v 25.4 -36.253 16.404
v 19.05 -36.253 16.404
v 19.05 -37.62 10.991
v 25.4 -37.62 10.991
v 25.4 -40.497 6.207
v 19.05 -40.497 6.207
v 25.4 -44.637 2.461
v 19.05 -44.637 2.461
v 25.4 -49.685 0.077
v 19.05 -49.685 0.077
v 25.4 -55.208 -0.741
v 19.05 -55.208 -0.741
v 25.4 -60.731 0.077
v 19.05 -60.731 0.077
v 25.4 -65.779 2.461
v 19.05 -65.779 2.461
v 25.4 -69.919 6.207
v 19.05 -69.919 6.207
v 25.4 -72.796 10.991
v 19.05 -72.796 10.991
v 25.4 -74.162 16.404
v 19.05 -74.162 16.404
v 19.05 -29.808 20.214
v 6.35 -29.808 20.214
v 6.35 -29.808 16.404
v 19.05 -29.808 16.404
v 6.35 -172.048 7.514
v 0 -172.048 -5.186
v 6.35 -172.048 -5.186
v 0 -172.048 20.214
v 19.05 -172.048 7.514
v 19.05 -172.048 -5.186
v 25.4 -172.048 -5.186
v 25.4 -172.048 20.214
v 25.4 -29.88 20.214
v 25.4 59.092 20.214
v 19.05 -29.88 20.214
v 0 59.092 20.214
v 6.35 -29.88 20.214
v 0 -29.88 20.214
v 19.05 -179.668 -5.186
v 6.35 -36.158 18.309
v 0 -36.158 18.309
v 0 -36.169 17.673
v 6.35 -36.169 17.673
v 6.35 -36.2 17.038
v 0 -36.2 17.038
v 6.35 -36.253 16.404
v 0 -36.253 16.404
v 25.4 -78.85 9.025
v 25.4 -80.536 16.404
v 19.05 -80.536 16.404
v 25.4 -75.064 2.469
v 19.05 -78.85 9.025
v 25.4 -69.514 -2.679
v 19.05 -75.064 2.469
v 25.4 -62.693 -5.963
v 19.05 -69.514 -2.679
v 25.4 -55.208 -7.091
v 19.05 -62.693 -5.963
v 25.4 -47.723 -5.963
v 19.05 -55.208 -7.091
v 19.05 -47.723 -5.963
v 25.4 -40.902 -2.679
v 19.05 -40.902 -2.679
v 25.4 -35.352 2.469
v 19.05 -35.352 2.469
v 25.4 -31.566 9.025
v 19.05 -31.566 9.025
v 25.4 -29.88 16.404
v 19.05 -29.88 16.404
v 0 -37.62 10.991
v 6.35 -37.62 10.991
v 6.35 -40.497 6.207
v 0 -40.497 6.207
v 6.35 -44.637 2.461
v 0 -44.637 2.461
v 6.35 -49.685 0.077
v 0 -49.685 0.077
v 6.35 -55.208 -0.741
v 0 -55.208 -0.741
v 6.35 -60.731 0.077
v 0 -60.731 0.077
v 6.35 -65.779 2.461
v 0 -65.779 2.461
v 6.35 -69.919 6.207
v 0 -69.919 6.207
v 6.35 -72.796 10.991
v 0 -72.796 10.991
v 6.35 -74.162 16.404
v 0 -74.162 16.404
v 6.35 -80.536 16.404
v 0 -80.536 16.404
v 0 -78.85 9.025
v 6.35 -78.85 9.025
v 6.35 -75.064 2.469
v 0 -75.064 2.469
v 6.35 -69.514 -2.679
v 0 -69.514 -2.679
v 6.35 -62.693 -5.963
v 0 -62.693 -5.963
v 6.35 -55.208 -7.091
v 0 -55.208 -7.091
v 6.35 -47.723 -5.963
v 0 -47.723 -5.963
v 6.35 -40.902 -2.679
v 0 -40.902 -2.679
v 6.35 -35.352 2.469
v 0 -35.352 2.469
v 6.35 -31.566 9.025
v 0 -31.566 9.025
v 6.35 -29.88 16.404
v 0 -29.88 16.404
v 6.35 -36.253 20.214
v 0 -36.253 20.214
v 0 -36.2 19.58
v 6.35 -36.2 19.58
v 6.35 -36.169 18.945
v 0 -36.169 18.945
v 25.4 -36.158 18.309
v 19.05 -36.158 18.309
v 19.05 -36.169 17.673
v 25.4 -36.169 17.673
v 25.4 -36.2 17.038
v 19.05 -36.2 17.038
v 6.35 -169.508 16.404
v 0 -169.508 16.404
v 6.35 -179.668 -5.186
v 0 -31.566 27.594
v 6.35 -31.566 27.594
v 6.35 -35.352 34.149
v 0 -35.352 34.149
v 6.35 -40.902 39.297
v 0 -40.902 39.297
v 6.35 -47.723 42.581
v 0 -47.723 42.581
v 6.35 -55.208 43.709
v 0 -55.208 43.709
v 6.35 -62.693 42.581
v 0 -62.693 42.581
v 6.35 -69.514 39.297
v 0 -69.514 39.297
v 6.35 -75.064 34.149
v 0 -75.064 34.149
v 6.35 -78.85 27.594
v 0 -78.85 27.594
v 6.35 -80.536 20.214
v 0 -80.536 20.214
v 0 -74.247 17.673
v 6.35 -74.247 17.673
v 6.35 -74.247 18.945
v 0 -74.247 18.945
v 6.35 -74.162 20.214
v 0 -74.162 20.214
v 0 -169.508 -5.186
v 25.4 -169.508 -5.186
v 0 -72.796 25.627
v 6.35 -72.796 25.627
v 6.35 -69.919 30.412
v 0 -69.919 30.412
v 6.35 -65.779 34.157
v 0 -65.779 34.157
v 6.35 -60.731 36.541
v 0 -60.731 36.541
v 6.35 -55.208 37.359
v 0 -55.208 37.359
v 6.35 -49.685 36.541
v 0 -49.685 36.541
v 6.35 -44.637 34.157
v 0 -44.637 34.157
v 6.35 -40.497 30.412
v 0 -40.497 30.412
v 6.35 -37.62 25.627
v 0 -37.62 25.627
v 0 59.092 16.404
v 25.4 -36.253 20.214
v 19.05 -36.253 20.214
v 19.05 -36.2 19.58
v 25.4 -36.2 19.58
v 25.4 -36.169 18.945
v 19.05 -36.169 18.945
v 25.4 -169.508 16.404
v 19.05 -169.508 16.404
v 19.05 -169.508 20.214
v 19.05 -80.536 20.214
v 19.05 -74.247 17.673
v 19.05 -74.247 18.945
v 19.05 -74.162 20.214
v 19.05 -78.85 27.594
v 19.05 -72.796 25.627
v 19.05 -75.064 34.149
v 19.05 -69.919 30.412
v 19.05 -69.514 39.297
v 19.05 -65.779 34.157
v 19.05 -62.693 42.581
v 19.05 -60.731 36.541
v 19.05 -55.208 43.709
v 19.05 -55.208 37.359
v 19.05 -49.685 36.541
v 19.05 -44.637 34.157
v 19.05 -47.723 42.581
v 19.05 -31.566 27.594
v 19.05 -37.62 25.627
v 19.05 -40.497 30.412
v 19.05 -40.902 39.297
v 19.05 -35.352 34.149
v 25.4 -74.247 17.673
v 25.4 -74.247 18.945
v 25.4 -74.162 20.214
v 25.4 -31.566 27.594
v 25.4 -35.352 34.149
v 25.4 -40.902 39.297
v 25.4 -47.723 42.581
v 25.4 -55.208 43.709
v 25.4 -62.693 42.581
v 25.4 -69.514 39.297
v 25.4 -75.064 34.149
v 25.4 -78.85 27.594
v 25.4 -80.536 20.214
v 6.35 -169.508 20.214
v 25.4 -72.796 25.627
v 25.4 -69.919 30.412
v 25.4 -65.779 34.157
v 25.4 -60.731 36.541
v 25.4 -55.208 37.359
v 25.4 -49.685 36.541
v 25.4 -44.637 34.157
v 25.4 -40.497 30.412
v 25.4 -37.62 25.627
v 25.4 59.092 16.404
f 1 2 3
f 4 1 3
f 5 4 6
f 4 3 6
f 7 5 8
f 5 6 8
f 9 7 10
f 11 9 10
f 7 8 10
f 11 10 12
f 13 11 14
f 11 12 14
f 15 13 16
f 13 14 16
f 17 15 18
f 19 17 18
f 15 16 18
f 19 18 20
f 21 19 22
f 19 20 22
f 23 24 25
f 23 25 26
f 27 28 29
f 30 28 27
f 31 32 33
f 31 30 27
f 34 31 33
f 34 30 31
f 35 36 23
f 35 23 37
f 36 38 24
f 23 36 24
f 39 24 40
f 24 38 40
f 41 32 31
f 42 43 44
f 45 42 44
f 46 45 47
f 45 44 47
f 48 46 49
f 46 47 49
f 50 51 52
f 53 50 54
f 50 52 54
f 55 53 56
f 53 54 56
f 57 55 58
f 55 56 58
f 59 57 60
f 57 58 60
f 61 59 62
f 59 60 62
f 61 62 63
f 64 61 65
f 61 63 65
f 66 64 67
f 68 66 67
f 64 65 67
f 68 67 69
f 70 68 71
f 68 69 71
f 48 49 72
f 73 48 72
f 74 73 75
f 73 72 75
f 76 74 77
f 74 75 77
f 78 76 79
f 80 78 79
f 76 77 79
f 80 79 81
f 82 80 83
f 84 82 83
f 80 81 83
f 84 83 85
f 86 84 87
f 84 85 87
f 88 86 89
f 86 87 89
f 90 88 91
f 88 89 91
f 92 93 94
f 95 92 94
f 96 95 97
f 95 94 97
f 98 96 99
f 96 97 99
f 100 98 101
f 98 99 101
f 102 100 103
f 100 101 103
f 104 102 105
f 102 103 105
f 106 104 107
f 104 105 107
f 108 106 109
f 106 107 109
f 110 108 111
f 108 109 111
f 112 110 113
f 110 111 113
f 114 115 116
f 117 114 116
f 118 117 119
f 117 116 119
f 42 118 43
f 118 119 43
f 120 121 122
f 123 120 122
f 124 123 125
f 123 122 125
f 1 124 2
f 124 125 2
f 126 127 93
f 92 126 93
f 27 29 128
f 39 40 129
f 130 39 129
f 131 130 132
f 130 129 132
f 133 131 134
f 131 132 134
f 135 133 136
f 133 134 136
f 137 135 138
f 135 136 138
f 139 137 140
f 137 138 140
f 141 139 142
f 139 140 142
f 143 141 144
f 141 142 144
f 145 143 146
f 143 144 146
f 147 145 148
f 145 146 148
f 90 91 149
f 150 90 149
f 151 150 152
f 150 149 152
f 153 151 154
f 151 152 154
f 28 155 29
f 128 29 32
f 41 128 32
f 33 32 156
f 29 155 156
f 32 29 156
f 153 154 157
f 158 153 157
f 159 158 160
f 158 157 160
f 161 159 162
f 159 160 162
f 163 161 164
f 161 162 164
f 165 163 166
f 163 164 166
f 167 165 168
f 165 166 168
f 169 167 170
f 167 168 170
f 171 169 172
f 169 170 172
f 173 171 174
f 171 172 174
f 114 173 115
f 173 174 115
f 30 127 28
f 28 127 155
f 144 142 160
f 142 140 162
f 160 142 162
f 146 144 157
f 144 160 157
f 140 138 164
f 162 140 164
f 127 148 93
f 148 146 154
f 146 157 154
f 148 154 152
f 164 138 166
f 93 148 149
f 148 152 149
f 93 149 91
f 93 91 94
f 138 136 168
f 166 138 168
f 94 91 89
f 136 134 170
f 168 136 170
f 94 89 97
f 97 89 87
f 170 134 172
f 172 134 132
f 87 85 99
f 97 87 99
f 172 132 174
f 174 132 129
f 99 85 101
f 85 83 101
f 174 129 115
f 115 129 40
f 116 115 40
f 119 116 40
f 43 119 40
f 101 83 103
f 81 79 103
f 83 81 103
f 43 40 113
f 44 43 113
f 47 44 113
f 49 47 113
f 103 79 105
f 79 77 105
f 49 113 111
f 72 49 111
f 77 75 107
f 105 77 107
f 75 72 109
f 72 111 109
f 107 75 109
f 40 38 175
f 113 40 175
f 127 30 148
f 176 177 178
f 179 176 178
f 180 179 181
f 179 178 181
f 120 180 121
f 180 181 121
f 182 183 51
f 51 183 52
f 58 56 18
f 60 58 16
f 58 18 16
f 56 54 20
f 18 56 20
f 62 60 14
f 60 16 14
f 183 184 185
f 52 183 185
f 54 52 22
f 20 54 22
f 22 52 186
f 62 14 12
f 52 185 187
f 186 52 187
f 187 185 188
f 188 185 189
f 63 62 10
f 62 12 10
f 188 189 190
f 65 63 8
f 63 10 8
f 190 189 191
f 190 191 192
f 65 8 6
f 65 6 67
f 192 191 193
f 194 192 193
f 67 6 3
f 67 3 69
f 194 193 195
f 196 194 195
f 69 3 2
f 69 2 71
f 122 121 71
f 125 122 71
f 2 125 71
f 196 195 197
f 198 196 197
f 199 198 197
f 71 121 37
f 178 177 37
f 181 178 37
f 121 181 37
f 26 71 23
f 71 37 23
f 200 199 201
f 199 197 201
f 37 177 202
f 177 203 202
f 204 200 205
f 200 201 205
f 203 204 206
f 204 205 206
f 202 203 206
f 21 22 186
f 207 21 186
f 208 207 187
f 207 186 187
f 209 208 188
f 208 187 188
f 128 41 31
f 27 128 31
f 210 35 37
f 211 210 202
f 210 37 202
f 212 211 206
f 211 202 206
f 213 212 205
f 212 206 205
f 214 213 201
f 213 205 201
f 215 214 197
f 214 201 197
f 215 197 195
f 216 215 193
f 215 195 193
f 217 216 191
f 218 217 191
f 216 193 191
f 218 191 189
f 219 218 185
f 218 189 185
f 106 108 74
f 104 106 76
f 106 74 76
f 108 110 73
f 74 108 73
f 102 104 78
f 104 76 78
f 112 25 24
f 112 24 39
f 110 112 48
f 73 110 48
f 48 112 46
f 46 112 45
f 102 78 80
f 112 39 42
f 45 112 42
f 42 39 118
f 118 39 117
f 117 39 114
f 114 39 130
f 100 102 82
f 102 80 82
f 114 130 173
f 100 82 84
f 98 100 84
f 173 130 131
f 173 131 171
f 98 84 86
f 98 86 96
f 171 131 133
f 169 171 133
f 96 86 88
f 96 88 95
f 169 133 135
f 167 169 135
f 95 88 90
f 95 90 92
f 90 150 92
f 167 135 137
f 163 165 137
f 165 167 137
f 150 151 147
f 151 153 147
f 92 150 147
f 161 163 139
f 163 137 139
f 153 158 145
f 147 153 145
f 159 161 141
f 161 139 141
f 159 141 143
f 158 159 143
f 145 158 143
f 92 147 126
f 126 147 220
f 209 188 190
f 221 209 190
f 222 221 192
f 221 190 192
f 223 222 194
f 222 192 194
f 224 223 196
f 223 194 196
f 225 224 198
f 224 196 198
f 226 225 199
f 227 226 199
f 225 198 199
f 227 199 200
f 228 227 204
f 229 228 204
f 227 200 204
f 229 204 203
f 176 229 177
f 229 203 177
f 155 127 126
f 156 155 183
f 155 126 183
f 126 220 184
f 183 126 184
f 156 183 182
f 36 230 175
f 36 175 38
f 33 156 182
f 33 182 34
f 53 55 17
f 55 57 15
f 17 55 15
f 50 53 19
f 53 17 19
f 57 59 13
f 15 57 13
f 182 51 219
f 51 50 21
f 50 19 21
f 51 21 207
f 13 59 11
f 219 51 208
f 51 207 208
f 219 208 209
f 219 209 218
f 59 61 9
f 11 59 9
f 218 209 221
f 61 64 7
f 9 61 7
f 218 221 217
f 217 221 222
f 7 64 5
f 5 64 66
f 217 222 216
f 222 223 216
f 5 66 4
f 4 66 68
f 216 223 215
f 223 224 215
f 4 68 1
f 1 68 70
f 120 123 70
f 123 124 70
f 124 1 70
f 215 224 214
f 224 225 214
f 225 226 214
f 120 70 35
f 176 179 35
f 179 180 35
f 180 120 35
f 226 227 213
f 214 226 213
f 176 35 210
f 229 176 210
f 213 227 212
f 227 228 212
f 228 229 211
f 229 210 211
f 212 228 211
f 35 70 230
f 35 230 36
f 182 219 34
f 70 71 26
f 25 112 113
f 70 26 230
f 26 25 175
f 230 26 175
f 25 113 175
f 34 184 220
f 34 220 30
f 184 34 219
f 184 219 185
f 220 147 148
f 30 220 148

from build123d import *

# Parameters (mm, degrees)
F0_W          = 88.9
F0_H          = 1.905
F1_DEPTH      = 25.4
F2_W          = 12.7
F2_H          = 88.9715382425
F2_H_2        = 50.7284617575
F3_DEPTH      = 50.8
F3_DEPTH_BACK = 25.4
F4_W          = 6.35
F4_H          = 3.81
F5_DEPTH      = 2.54
F6_W          = 12.7
F6_H          = 12.7
F7_DEPTH      = 7.62
F9_DEPTH      = 25.4


with BuildPart() as f1:
    # F0 (on Right) → F1 (new body)
    with BuildSketch(Plane.YZ):
        with Locations((14.6420187533, 19.2617916149)):
            Rectangle(F0_W, F0_H)
        with Locations((14.6420187533, 17.3567916149)):
            Rectangle(F0_W, F0_H)
        with BuildLine():
            ThreePointArc((-29.8795194892, 20.2142916149), (-29.8258721082, 19.2624629951), (-29.8079812467, 18.3092916149))
            Line((-29.8079812467, 18.3092916149), (-29.8079812467, 20.2142916149))
            Line((-29.8079812467, 20.2142916149), (-29.8795194892, 20.2142916149))
        make_face()
        with BuildLine():
            Line((-29.8079812467, 16.4042916149), (-29.8079812467, 18.3092916149))
            ThreePointArc((-29.8079812467, 18.3092916149), (-29.8258721082, 17.3561202347), (-29.8795194892, 16.4042916149))
            Line((-29.8795194892, 16.4042916149), (-29.8079812467, 16.4042916149))
        make_face()
        with BuildLine():
            ThreePointArc((-29.8795194892, 16.4042916149), (-29.8258721082, 17.3561202347), (-29.8079812467, 18.3092916149))
            ThreePointArc((-29.8079812467, 18.3092916149), (-29.8258721082, 19.2624629951), (-29.8795194892, 20.2142916149))
            Line((-29.8795194892, 20.2142916149), (-36.2534705698, 20.2142916149))
            ThreePointArc((-36.2534705698, 20.2142916149), (-36.181868554, 19.2629874798), (-36.1579812467, 18.3092916149))
            ThreePointArc((-36.1579812467, 18.3092916149), (-36.181868554, 17.35559575), (-36.2534705698, 16.4042916149))
            Line((-36.2534705698, 16.4042916149), (-29.8795194892, 16.4042916149))
        make_face()
        with BuildLine():
            Line((-36.2534705698, 20.2142916149), (-29.8795194892, 20.2142916149))
            ThreePointArc((-29.8795194892, 20.2142916149), (-55.2079812467, 43.7092916149), (-80.5364430042, 20.2142916149))
            Line((-80.5364430042, 20.2142916149), (-74.1624919236, 20.2142916149))
            ThreePointArc((-74.1624919236, 20.2142916149), (-55.2079812467, 37.3592916149), (-36.2534705698, 20.2142916149))
        make_face()
        with BuildLine():
            ThreePointArc((-80.5364430042, 16.4042916149), (-55.2079812467, -7.0907083851), (-29.8795194892, 16.4042916149))
            Line((-29.8795194892, 16.4042916149), (-36.2534705698, 16.4042916149))
            ThreePointArc((-36.2534705698, 16.4042916149), (-55.2079812467, -0.7407083851), (-74.1624919236, 16.4042916149))
            Line((-74.1624919236, 16.4042916149), (-80.5364430042, 16.4042916149))
        make_face()
        with BuildLine():
            Line((-74.1624919236, 20.2142916149), (-80.5364430042, 20.2142916149))
            ThreePointArc((-80.5364430042, 20.2142916149), (-80.6079812467, 18.3092916149), (-80.5364430042, 16.4042916149))
            Line((-80.5364430042, 16.4042916149), (-74.1624919236, 16.4042916149))
            ThreePointArc((-74.1624919236, 16.4042916149), (-74.2579812467, 18.3092916149), (-74.1624919236, 20.2142916149))
        make_face()
        with BuildLine():
            ThreePointArc((-80.5364430042, 16.4042916149), (-80.6079812467, 18.3092916149), (-80.5364430042, 20.2142916149))
            Line((-80.5364430042, 20.2142916149), (-169.5079812467, 20.2142916149))
            Line((-169.5079812467, 20.2142916149), (-169.5079812467, 16.4042916149))
            Line((-169.5079812467, 16.4042916149), (-80.5364430042, 16.4042916149))
        make_face()
    extrude(amount=F1_DEPTH)

    # F2 (on face) → F3 (cut, two sides)
    with BuildSketch(Plane.XY.offset(20.2142916149)) as f3_sk:
        with Locations((12.7, -125.0222121254)):
            Rectangle(F2_W, F2_H)
        with Locations((12.7, -55.1722121254)):
            Rectangle(F2_W, F2_H_2)
    extrude(amount=-F3_DEPTH, mode=Mode.SUBTRACT)
    extrude(f3_sk.sketch, amount=F3_DEPTH_BACK, mode=Mode.SUBTRACT)

    # F4 (on face) → F5 (join)
    with BuildSketch(Plane.XZ.offset(169.5079812467)):
        Polygon((25.4, 20.2142916149), (6.35, 20.2142916149), (6.35, 16.4042916149), (0, 16.4042916149), (0, -5.1857083851), (25.4, -5.1857083851), align=None)
        with Locations((3.175, 18.3092916149)):
            Rectangle(F4_W, F4_H)
    extrude(amount=F5_DEPTH)

    # F6 (on face) → F7 (join)
    with BuildSketch(Plane.XZ.offset(172.0479812467)):
        with Locations((12.7, 1.1642916149)):
            Rectangle(F6_W, F6_H)
    extrude(amount=F7_DEPTH)

    # F8 (on face) → F9 (cut)
    with BuildSketch(Plane.YZ.offset(19.05)):
        Polygon((-179.6679812467, 7.5142916149), (-179.6679812467, -5.1857083851), (-172.0479812467, 7.5142916149), align=None)
    extrude(amount=-F9_DEPTH, mode=Mode.SUBTRACT)


solid = f1.part
